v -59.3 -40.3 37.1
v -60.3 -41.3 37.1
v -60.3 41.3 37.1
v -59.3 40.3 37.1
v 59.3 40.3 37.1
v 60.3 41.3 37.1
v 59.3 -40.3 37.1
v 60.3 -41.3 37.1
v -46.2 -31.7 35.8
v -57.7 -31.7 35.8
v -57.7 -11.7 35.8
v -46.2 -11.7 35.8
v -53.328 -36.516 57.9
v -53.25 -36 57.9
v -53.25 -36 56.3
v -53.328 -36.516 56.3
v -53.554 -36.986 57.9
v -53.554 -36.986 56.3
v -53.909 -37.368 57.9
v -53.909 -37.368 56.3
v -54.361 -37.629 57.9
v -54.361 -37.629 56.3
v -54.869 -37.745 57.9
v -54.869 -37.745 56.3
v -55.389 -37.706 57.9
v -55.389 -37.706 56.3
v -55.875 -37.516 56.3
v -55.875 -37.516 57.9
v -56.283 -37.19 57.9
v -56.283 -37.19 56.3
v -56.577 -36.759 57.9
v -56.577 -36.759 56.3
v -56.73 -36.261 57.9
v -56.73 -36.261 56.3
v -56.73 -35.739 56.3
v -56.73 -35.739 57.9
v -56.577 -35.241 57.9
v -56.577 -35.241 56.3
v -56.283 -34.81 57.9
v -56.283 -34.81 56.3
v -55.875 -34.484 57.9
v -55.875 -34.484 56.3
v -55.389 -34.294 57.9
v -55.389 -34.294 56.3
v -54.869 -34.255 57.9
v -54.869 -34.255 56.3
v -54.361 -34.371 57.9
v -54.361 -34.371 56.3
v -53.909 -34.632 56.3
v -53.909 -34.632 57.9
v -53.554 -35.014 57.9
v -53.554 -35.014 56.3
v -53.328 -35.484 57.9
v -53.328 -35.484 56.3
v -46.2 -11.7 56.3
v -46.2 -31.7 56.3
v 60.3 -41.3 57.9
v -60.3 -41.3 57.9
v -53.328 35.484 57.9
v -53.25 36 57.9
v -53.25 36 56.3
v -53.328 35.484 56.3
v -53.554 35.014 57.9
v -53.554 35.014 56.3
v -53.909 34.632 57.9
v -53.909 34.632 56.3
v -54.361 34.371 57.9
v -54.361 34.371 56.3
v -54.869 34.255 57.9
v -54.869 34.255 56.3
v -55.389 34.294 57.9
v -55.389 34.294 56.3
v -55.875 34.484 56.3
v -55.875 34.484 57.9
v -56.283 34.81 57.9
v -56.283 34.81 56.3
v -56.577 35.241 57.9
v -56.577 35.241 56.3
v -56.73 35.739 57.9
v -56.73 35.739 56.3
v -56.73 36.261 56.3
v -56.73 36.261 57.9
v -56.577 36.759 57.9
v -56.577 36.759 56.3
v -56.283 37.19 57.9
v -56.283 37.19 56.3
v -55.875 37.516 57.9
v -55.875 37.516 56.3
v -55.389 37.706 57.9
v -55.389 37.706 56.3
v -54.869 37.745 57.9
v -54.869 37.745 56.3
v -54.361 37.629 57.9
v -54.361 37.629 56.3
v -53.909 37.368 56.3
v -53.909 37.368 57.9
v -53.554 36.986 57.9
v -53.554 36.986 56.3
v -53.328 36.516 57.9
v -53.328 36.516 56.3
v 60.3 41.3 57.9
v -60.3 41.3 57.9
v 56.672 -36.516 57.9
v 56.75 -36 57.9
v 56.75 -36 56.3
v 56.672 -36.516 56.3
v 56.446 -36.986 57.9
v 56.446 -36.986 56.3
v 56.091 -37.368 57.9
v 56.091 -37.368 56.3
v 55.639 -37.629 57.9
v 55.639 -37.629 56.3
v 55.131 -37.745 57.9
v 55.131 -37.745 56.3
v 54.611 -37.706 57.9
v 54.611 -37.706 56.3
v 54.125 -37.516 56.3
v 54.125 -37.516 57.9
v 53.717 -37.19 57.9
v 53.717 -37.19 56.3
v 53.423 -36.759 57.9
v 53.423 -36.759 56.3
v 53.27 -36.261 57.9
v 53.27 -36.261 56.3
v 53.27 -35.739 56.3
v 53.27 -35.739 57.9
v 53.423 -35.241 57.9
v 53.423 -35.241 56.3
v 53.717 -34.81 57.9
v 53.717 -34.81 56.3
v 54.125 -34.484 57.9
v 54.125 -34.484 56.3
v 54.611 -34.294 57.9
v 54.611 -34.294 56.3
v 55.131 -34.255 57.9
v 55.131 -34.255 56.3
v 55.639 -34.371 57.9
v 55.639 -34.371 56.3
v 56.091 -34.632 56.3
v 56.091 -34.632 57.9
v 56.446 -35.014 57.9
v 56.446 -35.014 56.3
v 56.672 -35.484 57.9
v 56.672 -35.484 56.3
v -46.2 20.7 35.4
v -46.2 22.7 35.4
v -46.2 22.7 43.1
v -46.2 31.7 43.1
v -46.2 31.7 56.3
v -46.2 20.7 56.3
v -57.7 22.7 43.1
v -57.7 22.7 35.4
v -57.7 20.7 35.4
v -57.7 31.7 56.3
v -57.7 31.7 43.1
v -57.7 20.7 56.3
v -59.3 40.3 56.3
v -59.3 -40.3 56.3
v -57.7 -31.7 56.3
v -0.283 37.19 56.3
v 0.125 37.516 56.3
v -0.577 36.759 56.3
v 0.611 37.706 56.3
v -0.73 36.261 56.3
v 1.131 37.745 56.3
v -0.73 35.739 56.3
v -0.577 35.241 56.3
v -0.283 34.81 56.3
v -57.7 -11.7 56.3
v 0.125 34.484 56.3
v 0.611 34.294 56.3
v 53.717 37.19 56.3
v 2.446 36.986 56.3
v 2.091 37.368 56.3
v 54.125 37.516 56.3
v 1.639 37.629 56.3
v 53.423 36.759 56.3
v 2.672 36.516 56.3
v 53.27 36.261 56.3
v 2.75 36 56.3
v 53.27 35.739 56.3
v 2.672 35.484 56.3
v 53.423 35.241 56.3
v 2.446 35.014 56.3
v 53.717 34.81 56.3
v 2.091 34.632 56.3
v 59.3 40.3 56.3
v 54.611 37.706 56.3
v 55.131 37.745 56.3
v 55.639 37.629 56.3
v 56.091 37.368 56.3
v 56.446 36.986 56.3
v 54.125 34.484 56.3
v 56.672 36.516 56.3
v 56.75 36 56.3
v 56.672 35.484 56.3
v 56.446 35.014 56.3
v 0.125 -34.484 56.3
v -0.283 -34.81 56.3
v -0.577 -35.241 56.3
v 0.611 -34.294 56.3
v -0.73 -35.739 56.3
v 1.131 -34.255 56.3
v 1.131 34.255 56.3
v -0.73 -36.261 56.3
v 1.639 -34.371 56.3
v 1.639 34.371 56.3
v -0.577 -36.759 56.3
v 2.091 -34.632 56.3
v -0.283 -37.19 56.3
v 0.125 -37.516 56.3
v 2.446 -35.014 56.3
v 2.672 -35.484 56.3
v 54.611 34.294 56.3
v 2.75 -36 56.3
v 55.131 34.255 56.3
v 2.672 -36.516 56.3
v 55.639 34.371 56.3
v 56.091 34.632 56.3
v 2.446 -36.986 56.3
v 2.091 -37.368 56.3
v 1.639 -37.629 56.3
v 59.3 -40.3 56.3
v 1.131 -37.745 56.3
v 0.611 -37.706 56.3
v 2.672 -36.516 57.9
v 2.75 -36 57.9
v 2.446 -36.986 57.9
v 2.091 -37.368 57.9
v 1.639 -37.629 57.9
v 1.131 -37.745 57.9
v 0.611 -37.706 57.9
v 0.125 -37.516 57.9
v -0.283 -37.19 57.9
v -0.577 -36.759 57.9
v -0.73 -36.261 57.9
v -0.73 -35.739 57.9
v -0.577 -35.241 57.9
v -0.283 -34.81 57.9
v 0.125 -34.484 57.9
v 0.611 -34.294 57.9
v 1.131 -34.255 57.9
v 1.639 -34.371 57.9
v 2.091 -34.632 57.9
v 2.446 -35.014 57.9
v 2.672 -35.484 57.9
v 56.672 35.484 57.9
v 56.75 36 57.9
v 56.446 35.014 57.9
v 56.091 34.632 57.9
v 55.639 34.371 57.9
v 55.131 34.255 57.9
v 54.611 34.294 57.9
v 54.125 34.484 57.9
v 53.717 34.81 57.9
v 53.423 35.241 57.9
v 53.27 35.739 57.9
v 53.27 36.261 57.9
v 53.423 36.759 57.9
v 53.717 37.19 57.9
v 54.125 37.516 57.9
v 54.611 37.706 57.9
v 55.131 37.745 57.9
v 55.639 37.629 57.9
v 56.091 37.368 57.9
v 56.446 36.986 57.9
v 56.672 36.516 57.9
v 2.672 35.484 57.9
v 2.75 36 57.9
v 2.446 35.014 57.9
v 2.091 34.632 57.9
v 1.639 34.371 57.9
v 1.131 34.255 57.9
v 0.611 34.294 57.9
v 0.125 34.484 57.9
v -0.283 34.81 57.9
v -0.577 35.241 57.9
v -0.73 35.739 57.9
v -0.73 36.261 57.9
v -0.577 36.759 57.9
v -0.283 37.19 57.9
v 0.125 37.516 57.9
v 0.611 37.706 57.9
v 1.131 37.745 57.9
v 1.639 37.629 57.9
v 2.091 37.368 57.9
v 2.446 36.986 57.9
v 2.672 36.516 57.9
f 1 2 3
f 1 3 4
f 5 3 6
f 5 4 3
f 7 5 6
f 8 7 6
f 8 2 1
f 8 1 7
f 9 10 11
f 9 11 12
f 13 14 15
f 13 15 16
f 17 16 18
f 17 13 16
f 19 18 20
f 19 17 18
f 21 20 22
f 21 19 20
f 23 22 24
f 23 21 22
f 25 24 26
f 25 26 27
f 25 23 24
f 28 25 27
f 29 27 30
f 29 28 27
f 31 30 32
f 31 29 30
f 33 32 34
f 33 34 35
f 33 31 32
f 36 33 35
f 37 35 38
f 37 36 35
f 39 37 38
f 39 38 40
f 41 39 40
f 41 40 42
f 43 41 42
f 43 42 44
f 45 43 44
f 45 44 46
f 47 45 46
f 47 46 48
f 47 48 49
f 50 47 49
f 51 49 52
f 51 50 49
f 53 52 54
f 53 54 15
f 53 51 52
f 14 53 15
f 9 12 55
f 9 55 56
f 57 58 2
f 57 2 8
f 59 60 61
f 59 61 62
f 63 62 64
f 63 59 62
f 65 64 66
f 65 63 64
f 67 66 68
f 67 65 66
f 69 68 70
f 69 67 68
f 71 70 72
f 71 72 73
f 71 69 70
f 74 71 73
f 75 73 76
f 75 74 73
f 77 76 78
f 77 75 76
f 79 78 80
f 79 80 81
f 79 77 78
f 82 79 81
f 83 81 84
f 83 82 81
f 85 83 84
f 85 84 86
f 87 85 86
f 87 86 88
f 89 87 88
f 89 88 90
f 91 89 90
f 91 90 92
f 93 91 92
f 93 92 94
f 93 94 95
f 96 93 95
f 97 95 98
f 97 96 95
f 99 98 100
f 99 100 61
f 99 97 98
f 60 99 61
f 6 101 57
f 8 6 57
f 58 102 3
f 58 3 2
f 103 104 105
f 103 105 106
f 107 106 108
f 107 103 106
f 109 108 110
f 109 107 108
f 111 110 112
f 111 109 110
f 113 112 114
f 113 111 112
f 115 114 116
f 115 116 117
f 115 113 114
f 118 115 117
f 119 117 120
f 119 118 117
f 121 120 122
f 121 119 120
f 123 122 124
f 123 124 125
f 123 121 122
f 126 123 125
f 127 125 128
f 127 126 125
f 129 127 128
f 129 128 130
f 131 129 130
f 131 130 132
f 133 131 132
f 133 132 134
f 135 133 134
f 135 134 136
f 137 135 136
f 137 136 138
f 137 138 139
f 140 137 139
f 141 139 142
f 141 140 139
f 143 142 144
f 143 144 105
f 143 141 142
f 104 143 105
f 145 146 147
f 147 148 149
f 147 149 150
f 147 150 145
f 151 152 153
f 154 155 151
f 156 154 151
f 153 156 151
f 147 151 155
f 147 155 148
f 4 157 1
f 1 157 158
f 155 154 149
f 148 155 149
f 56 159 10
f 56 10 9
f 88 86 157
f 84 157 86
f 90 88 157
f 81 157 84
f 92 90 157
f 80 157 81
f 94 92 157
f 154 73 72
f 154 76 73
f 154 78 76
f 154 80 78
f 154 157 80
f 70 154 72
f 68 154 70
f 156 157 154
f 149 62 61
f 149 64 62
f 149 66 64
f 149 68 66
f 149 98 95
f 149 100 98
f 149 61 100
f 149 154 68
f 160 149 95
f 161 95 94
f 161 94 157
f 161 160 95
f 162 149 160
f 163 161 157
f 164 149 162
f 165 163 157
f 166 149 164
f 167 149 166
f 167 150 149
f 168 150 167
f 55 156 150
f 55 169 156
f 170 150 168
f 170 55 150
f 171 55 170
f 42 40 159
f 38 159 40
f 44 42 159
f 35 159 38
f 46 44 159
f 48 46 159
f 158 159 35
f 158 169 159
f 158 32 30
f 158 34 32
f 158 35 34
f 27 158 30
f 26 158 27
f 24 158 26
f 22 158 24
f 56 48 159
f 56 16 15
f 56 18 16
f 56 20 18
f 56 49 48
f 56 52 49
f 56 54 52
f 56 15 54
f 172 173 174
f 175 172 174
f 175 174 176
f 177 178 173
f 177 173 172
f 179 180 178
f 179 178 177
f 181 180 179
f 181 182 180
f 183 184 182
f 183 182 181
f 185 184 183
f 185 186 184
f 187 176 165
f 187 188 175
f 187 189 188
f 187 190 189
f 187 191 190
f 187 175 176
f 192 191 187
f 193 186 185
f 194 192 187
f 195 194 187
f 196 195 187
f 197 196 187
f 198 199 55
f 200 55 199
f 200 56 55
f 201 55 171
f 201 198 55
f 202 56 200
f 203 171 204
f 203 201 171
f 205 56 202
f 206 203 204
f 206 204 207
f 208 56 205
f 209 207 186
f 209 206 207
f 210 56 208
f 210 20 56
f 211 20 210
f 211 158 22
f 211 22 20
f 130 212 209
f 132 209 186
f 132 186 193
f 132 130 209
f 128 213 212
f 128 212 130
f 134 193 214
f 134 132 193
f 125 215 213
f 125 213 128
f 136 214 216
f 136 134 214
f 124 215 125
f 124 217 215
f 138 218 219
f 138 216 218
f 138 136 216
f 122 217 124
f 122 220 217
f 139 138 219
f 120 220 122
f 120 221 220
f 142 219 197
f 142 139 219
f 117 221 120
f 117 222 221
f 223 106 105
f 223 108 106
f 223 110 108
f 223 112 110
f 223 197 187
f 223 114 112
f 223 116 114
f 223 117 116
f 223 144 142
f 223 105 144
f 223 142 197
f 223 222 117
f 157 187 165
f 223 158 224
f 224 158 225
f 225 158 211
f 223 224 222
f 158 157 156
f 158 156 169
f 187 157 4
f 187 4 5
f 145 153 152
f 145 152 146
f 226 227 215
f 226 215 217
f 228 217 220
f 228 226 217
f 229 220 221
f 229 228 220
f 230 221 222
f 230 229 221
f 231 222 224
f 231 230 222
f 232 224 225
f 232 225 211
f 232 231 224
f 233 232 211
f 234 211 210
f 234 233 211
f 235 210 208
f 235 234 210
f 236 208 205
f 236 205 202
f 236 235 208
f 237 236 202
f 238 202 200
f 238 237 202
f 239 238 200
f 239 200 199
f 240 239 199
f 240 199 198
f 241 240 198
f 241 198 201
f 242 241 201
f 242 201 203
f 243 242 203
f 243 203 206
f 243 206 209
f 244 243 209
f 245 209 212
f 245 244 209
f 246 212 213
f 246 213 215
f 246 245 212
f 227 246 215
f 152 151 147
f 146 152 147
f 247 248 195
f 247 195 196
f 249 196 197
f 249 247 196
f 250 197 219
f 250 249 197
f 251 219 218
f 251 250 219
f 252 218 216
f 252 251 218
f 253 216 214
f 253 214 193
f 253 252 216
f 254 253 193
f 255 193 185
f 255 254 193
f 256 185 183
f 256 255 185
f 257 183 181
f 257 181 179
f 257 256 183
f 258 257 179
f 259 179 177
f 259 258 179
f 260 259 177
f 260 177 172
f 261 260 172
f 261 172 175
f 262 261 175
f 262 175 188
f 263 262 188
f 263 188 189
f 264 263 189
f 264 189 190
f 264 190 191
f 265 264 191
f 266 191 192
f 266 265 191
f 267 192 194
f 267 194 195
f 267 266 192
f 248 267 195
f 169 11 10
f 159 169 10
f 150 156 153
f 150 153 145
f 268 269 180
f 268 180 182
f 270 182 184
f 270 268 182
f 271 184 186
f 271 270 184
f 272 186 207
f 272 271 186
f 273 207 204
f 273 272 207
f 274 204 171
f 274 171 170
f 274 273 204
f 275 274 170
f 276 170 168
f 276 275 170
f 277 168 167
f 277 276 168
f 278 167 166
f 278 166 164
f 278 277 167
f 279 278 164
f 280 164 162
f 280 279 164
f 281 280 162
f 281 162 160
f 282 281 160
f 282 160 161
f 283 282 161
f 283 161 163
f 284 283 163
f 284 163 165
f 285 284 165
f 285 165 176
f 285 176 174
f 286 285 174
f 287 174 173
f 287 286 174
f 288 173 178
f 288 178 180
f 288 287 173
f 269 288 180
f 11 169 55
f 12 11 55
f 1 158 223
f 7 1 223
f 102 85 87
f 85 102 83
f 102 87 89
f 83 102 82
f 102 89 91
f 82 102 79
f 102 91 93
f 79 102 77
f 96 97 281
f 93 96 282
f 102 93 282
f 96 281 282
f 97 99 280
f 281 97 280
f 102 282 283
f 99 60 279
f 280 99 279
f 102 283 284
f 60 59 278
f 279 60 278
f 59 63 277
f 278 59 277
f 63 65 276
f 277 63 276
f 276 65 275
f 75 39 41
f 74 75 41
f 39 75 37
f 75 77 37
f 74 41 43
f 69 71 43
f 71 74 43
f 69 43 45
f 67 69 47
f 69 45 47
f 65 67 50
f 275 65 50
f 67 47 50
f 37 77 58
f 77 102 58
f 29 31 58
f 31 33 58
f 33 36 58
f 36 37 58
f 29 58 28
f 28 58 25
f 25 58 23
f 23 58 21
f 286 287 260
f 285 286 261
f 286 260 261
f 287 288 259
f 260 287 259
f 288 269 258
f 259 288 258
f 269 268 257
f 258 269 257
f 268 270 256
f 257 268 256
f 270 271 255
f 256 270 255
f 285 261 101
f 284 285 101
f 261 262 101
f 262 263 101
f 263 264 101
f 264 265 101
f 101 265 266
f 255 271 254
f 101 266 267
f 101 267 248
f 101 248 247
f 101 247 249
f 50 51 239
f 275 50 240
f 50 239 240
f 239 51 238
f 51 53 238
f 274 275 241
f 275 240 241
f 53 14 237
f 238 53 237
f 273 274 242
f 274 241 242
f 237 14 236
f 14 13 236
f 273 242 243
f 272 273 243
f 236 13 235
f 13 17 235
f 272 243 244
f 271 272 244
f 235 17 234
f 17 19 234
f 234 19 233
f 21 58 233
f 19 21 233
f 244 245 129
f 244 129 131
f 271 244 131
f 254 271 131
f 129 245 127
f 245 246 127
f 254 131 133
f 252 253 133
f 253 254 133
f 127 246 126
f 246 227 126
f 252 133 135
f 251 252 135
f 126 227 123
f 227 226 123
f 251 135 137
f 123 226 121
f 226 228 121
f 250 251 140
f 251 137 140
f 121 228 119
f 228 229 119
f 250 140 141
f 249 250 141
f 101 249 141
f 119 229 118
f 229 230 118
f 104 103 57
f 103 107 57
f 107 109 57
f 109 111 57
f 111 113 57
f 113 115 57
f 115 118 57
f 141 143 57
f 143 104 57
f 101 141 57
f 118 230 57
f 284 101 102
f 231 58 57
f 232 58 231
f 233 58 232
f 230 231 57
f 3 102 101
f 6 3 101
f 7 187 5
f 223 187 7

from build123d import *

# Parameters (mm, degrees)
SKETCH009_W             = 120.6
SKETCH009_H             = 82.6
PAD006_DEPTH            = 1.6
SKETCH010_W             = 120.6
SKETCH010_H             = 82.6
SKETCH010_W_2           = 118.6
SKETCH010_H_2           = 80.6
PAD007_DEPTH            = 20.8
SKETCH011_W             = 11.5
SKETCH011_H             = 9
PAD008_DEPTH            = 14.8
SKETCH012_W             = 11.5
SKETCH012_H             = 2
PAD009_DEPTH            = 22.5
SKETCH014_R             = 1.75
POCKET004_DEPTH         = 1.6
SKETCH020_W             = 11.5
SKETCH020_H             = 20
PAD013_DEPTH            = 22.1
BODY003_PLACEMENT_ANGLE = 180


with BuildPart() as part:
    # Sketch009 → Pad006 (new body)
    with BuildSketch(Plane.XY):
        Rectangle(SKETCH009_W, SKETCH009_H)
    extrude(amount=PAD006_DEPTH)

    # Sketch010 → Pad007 (join)
    with BuildSketch(Plane.XY):
        Rectangle(SKETCH010_W, SKETCH010_H)
        Rectangle(SKETCH010_W_2, SKETCH010_H_2, mode=Mode.SUBTRACT)
    extrude(amount=PAD007_DEPTH)

    # Sketch011 → Pad008 (join)
    with BuildSketch(Plane.XY):
        with Locations((-51.95, -27.2)):
            Rectangle(SKETCH011_W, SKETCH011_H)
    extrude(amount=PAD008_DEPTH)

    # Sketch012 → Pad009 (join)
    with BuildSketch(Plane.XY):
        with Locations((-51.95, -21.7)):
            Rectangle(SKETCH012_W, SKETCH012_H)
    extrude(amount=PAD009_DEPTH)

    # Sketch014 → Pocket004 (cut)
    with BuildSketch(Plane.XY):
        with Locations((-55, 36)):
            Circle(SKETCH014_R)
        with Locations((1, 36)):
            Circle(SKETCH014_R)
        with Locations((55, 36)):
            Circle(SKETCH014_R)
        with Locations((55, -36)):
            Circle(SKETCH014_R)
        with Locations((1, -36)):
            Circle(SKETCH014_R)
        with Locations((-55, -36)):
            Circle(SKETCH014_R)
    extrude(amount=POCKET004_DEPTH, mode=Mode.SUBTRACT)

    # Sketch020 → Pad013 (join)
    with BuildSketch(Plane.XY):
        with Locations((-51.95, 21.7)):
            Rectangle(SKETCH020_W, SKETCH020_H)
    extrude(amount=PAD013_DEPTH)


with BuildPart() as part_1:
    # Body003 placement: moved
    add(part.part.moved(Location((0, 0, 57.9))).rotate(Axis((0, 0, 57.9), (1, 0, 0)), BODY003_PLACEMENT_ANGLE))


solid = part_1.part
